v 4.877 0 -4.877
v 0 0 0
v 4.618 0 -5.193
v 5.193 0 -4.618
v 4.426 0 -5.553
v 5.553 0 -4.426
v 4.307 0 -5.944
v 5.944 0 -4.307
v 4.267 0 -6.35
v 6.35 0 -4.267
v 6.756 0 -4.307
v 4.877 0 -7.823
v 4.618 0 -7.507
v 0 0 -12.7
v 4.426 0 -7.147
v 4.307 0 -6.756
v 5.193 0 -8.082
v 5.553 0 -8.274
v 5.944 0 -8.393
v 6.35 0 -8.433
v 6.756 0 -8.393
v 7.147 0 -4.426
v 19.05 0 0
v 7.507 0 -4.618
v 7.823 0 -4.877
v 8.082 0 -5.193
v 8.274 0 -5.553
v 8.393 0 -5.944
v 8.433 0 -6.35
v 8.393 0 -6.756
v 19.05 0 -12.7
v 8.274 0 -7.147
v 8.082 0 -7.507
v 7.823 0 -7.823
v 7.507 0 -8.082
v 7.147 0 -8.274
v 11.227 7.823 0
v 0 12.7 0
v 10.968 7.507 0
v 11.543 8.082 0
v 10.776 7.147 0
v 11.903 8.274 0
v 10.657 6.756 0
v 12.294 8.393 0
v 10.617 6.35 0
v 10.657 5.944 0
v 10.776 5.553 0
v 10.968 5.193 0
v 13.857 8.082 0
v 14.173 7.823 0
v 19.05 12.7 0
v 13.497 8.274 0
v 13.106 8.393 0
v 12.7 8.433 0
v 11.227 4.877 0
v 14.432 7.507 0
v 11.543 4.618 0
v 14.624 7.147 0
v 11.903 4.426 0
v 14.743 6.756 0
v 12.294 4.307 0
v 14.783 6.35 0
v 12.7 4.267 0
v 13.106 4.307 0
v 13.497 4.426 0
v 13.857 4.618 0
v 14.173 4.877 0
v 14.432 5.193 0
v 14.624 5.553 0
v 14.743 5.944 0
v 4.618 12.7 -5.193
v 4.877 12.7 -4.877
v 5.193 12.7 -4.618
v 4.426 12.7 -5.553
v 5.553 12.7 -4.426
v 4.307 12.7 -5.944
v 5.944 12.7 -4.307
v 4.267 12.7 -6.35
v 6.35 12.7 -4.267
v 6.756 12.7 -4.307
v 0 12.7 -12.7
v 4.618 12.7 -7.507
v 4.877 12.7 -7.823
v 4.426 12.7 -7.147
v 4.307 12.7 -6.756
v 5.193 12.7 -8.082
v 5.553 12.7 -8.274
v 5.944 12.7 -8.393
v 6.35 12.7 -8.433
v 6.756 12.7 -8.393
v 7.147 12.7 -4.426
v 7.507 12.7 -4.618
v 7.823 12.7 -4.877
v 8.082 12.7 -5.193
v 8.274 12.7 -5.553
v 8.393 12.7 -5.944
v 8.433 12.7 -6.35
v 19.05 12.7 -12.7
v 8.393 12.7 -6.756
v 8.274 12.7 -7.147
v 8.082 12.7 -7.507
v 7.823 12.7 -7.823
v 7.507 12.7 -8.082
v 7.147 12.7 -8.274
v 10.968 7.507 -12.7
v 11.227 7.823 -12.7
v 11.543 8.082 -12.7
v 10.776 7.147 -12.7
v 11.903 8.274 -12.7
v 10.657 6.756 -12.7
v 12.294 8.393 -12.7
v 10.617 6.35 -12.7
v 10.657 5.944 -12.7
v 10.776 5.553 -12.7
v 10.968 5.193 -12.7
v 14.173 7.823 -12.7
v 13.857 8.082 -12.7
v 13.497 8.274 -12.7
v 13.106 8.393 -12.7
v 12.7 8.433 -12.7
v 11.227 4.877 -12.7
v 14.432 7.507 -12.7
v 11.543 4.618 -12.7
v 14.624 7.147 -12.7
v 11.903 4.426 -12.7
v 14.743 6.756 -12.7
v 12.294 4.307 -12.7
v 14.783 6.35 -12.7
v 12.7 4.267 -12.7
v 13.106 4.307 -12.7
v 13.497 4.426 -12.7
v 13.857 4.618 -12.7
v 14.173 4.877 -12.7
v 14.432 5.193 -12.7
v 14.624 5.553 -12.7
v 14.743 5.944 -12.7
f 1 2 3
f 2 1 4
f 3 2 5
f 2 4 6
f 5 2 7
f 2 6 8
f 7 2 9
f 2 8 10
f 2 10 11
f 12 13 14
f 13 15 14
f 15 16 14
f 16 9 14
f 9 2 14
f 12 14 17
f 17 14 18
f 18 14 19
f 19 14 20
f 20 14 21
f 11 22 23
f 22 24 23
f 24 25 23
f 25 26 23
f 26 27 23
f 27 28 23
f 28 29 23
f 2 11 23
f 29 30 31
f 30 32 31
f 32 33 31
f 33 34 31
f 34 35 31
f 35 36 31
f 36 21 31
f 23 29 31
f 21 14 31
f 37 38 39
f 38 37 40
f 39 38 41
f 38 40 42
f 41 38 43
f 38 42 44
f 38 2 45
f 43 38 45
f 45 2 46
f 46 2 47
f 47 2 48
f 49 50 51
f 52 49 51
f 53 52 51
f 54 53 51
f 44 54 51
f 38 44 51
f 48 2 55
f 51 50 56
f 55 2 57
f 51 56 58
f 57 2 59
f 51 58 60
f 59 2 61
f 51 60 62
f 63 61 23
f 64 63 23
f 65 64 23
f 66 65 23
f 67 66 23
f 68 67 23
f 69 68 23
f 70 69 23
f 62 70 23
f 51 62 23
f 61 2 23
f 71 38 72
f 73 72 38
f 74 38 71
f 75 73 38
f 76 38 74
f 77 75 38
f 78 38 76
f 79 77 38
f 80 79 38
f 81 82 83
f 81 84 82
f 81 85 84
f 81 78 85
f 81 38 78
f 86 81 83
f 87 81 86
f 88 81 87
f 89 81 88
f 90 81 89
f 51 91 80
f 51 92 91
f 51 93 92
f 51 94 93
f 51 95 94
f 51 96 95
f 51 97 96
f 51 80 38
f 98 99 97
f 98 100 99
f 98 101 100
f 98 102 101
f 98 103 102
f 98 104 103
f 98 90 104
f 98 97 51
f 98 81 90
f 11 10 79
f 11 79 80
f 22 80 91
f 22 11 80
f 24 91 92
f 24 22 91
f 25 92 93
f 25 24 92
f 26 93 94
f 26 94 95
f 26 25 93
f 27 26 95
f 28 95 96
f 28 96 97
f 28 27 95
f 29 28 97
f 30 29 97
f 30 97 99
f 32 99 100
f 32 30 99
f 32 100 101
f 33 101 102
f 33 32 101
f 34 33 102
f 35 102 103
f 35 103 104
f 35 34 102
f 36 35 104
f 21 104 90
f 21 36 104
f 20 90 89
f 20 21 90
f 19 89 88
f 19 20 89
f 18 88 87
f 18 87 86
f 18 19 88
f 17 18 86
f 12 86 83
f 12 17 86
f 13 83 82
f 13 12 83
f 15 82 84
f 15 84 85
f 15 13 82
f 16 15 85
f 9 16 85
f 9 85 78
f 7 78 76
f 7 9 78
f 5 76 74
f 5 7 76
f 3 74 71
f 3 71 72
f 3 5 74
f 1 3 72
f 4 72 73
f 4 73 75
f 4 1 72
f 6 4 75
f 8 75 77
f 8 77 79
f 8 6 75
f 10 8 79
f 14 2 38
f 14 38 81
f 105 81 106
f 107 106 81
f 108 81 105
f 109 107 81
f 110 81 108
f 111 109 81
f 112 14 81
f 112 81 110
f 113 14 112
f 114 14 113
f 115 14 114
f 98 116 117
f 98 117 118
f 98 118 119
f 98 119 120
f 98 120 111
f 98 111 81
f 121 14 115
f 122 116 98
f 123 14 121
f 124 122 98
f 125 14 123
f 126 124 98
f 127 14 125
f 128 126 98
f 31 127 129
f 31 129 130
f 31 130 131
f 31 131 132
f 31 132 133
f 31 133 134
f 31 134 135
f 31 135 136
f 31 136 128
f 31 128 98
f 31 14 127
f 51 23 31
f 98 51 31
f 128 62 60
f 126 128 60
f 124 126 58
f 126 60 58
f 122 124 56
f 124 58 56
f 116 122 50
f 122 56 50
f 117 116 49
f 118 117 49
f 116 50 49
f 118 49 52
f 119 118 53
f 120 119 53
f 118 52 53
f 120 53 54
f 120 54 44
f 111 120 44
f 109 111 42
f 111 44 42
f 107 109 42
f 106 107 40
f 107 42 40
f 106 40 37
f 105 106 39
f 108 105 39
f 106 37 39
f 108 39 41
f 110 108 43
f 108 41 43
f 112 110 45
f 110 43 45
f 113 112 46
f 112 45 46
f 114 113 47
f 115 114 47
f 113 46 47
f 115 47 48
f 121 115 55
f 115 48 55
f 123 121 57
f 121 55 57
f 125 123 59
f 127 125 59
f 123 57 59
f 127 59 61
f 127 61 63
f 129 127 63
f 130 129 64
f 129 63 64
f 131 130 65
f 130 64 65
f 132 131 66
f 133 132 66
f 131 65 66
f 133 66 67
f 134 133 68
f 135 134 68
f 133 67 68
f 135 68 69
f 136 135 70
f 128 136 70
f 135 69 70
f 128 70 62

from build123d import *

# Parameters (mm, degrees)
SKETCH1_W           = 19.05
SKETCH1_H           = 12.7
SKETCH1_R           = 2.0828
BOSS_EXTRUDE1_DEPTH = 12.7
SKETCH2_R           = 2.0828
CUT_EXTRUDE1_DEPTH  = 12.7


with BuildPart() as part:
    # Sketch1 → Boss-Extrude1 (new body)
    with BuildSketch(Plane(origin=(0, 0, 0), x_dir=(1, 0, 0), z_dir=(0, 1, 0))):
        with Locations((9.525, 6.35)):
            Rectangle(SKETCH1_W, SKETCH1_H)
        with Locations(Location((6.35, 6.35, 0), (0, 0, 270))):
            Circle(SKETCH1_R, mode=Mode.SUBTRACT)
    extrude(amount=BOSS_EXTRUDE1_DEPTH)

    # Sketch2 → Cut-Extrude1 (cut)
    with BuildSketch(Plane.XY):
        with Locations((12.7, 6.35)):
            Circle(SKETCH2_R)
    extrude(amount=-CUT_EXTRUDE1_DEPTH, mode=Mode.SUBTRACT)


solid = part.part
